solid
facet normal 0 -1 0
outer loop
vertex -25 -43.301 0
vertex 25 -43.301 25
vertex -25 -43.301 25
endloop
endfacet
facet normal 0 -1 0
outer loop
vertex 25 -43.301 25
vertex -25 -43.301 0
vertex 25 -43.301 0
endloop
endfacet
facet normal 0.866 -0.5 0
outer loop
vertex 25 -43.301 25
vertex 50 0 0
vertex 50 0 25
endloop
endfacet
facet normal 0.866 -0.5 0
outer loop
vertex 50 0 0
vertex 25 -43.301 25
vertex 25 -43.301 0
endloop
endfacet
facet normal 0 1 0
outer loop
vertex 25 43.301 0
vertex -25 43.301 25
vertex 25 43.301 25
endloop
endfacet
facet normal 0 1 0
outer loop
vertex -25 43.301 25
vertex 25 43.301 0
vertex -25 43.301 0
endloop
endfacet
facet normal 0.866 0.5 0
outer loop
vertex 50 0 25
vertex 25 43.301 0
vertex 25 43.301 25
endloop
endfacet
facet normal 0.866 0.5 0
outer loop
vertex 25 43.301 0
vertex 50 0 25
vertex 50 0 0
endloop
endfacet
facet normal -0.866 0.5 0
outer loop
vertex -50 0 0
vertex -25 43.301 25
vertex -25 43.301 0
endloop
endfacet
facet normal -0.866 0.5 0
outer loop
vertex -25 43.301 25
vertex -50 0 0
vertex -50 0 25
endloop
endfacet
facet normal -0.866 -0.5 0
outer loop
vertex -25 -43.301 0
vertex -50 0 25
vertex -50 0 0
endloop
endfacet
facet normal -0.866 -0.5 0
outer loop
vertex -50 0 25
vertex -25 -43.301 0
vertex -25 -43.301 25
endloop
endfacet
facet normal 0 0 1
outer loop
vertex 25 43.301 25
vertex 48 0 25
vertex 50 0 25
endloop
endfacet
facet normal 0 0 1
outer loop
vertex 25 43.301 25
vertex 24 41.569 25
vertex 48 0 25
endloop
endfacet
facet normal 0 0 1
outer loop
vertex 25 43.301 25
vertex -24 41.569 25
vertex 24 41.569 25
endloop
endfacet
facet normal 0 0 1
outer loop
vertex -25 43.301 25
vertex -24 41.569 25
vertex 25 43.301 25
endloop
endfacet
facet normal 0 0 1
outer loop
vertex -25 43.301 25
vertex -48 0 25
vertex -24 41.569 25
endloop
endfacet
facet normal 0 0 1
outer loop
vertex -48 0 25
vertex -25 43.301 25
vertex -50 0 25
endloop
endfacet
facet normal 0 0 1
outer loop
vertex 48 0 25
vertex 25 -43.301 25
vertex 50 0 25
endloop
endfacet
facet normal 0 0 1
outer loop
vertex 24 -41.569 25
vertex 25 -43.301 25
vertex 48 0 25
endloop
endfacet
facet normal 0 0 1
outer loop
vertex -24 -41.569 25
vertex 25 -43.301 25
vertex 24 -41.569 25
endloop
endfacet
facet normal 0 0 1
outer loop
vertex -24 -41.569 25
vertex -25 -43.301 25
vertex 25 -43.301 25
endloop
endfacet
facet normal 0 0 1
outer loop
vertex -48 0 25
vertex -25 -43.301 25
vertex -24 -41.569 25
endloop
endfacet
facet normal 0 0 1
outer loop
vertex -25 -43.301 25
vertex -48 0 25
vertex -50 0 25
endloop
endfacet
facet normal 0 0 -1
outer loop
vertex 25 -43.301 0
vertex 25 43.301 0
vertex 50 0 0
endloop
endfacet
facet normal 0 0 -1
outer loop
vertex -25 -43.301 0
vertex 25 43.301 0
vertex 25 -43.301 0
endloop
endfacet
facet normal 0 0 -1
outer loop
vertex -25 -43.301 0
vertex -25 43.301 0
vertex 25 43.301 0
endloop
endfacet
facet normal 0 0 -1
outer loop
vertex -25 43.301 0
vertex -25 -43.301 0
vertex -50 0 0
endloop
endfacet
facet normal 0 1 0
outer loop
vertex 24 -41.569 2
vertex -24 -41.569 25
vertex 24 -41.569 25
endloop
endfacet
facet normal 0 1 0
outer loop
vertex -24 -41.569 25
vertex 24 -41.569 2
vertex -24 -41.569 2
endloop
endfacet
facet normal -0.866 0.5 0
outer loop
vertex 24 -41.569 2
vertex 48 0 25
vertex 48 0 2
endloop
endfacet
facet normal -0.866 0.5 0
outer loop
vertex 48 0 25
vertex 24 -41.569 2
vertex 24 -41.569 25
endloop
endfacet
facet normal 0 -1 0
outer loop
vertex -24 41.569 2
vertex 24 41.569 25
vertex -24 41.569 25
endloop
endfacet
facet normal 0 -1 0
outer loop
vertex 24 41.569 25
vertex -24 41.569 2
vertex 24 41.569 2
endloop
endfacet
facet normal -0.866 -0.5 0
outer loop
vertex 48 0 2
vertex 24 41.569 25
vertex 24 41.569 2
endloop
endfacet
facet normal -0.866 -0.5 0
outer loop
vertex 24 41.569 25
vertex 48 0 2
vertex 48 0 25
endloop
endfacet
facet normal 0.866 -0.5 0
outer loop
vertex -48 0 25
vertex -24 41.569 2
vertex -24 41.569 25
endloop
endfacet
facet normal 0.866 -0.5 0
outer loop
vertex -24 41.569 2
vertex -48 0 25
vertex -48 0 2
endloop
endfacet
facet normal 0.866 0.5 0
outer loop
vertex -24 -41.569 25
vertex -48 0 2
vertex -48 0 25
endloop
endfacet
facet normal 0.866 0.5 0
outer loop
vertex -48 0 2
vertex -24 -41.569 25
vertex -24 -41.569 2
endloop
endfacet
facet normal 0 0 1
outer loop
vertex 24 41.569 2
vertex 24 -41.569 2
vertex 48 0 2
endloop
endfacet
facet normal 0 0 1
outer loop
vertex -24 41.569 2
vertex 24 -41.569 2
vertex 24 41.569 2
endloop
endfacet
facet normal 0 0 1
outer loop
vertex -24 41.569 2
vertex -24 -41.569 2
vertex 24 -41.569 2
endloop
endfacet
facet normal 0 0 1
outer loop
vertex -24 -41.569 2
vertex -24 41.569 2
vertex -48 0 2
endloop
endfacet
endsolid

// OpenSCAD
// file: parameters.scad
$radius = 100;
$height = 50;

$margin = 2;

$connection = 5;

$hole_dia = 4;
// main file
include <parameters.scad>

module basin() {
  color("cyan") difference() {
    cylinder(h = $height / 2, r = $radius / 2, $fn = 6);

    // DIFF
    translate([ 0, 0, $margin ])
        cylinder(h = $height / 2, r = $radius / 2 - $margin, $fn = 6);
  }
}
basin();
